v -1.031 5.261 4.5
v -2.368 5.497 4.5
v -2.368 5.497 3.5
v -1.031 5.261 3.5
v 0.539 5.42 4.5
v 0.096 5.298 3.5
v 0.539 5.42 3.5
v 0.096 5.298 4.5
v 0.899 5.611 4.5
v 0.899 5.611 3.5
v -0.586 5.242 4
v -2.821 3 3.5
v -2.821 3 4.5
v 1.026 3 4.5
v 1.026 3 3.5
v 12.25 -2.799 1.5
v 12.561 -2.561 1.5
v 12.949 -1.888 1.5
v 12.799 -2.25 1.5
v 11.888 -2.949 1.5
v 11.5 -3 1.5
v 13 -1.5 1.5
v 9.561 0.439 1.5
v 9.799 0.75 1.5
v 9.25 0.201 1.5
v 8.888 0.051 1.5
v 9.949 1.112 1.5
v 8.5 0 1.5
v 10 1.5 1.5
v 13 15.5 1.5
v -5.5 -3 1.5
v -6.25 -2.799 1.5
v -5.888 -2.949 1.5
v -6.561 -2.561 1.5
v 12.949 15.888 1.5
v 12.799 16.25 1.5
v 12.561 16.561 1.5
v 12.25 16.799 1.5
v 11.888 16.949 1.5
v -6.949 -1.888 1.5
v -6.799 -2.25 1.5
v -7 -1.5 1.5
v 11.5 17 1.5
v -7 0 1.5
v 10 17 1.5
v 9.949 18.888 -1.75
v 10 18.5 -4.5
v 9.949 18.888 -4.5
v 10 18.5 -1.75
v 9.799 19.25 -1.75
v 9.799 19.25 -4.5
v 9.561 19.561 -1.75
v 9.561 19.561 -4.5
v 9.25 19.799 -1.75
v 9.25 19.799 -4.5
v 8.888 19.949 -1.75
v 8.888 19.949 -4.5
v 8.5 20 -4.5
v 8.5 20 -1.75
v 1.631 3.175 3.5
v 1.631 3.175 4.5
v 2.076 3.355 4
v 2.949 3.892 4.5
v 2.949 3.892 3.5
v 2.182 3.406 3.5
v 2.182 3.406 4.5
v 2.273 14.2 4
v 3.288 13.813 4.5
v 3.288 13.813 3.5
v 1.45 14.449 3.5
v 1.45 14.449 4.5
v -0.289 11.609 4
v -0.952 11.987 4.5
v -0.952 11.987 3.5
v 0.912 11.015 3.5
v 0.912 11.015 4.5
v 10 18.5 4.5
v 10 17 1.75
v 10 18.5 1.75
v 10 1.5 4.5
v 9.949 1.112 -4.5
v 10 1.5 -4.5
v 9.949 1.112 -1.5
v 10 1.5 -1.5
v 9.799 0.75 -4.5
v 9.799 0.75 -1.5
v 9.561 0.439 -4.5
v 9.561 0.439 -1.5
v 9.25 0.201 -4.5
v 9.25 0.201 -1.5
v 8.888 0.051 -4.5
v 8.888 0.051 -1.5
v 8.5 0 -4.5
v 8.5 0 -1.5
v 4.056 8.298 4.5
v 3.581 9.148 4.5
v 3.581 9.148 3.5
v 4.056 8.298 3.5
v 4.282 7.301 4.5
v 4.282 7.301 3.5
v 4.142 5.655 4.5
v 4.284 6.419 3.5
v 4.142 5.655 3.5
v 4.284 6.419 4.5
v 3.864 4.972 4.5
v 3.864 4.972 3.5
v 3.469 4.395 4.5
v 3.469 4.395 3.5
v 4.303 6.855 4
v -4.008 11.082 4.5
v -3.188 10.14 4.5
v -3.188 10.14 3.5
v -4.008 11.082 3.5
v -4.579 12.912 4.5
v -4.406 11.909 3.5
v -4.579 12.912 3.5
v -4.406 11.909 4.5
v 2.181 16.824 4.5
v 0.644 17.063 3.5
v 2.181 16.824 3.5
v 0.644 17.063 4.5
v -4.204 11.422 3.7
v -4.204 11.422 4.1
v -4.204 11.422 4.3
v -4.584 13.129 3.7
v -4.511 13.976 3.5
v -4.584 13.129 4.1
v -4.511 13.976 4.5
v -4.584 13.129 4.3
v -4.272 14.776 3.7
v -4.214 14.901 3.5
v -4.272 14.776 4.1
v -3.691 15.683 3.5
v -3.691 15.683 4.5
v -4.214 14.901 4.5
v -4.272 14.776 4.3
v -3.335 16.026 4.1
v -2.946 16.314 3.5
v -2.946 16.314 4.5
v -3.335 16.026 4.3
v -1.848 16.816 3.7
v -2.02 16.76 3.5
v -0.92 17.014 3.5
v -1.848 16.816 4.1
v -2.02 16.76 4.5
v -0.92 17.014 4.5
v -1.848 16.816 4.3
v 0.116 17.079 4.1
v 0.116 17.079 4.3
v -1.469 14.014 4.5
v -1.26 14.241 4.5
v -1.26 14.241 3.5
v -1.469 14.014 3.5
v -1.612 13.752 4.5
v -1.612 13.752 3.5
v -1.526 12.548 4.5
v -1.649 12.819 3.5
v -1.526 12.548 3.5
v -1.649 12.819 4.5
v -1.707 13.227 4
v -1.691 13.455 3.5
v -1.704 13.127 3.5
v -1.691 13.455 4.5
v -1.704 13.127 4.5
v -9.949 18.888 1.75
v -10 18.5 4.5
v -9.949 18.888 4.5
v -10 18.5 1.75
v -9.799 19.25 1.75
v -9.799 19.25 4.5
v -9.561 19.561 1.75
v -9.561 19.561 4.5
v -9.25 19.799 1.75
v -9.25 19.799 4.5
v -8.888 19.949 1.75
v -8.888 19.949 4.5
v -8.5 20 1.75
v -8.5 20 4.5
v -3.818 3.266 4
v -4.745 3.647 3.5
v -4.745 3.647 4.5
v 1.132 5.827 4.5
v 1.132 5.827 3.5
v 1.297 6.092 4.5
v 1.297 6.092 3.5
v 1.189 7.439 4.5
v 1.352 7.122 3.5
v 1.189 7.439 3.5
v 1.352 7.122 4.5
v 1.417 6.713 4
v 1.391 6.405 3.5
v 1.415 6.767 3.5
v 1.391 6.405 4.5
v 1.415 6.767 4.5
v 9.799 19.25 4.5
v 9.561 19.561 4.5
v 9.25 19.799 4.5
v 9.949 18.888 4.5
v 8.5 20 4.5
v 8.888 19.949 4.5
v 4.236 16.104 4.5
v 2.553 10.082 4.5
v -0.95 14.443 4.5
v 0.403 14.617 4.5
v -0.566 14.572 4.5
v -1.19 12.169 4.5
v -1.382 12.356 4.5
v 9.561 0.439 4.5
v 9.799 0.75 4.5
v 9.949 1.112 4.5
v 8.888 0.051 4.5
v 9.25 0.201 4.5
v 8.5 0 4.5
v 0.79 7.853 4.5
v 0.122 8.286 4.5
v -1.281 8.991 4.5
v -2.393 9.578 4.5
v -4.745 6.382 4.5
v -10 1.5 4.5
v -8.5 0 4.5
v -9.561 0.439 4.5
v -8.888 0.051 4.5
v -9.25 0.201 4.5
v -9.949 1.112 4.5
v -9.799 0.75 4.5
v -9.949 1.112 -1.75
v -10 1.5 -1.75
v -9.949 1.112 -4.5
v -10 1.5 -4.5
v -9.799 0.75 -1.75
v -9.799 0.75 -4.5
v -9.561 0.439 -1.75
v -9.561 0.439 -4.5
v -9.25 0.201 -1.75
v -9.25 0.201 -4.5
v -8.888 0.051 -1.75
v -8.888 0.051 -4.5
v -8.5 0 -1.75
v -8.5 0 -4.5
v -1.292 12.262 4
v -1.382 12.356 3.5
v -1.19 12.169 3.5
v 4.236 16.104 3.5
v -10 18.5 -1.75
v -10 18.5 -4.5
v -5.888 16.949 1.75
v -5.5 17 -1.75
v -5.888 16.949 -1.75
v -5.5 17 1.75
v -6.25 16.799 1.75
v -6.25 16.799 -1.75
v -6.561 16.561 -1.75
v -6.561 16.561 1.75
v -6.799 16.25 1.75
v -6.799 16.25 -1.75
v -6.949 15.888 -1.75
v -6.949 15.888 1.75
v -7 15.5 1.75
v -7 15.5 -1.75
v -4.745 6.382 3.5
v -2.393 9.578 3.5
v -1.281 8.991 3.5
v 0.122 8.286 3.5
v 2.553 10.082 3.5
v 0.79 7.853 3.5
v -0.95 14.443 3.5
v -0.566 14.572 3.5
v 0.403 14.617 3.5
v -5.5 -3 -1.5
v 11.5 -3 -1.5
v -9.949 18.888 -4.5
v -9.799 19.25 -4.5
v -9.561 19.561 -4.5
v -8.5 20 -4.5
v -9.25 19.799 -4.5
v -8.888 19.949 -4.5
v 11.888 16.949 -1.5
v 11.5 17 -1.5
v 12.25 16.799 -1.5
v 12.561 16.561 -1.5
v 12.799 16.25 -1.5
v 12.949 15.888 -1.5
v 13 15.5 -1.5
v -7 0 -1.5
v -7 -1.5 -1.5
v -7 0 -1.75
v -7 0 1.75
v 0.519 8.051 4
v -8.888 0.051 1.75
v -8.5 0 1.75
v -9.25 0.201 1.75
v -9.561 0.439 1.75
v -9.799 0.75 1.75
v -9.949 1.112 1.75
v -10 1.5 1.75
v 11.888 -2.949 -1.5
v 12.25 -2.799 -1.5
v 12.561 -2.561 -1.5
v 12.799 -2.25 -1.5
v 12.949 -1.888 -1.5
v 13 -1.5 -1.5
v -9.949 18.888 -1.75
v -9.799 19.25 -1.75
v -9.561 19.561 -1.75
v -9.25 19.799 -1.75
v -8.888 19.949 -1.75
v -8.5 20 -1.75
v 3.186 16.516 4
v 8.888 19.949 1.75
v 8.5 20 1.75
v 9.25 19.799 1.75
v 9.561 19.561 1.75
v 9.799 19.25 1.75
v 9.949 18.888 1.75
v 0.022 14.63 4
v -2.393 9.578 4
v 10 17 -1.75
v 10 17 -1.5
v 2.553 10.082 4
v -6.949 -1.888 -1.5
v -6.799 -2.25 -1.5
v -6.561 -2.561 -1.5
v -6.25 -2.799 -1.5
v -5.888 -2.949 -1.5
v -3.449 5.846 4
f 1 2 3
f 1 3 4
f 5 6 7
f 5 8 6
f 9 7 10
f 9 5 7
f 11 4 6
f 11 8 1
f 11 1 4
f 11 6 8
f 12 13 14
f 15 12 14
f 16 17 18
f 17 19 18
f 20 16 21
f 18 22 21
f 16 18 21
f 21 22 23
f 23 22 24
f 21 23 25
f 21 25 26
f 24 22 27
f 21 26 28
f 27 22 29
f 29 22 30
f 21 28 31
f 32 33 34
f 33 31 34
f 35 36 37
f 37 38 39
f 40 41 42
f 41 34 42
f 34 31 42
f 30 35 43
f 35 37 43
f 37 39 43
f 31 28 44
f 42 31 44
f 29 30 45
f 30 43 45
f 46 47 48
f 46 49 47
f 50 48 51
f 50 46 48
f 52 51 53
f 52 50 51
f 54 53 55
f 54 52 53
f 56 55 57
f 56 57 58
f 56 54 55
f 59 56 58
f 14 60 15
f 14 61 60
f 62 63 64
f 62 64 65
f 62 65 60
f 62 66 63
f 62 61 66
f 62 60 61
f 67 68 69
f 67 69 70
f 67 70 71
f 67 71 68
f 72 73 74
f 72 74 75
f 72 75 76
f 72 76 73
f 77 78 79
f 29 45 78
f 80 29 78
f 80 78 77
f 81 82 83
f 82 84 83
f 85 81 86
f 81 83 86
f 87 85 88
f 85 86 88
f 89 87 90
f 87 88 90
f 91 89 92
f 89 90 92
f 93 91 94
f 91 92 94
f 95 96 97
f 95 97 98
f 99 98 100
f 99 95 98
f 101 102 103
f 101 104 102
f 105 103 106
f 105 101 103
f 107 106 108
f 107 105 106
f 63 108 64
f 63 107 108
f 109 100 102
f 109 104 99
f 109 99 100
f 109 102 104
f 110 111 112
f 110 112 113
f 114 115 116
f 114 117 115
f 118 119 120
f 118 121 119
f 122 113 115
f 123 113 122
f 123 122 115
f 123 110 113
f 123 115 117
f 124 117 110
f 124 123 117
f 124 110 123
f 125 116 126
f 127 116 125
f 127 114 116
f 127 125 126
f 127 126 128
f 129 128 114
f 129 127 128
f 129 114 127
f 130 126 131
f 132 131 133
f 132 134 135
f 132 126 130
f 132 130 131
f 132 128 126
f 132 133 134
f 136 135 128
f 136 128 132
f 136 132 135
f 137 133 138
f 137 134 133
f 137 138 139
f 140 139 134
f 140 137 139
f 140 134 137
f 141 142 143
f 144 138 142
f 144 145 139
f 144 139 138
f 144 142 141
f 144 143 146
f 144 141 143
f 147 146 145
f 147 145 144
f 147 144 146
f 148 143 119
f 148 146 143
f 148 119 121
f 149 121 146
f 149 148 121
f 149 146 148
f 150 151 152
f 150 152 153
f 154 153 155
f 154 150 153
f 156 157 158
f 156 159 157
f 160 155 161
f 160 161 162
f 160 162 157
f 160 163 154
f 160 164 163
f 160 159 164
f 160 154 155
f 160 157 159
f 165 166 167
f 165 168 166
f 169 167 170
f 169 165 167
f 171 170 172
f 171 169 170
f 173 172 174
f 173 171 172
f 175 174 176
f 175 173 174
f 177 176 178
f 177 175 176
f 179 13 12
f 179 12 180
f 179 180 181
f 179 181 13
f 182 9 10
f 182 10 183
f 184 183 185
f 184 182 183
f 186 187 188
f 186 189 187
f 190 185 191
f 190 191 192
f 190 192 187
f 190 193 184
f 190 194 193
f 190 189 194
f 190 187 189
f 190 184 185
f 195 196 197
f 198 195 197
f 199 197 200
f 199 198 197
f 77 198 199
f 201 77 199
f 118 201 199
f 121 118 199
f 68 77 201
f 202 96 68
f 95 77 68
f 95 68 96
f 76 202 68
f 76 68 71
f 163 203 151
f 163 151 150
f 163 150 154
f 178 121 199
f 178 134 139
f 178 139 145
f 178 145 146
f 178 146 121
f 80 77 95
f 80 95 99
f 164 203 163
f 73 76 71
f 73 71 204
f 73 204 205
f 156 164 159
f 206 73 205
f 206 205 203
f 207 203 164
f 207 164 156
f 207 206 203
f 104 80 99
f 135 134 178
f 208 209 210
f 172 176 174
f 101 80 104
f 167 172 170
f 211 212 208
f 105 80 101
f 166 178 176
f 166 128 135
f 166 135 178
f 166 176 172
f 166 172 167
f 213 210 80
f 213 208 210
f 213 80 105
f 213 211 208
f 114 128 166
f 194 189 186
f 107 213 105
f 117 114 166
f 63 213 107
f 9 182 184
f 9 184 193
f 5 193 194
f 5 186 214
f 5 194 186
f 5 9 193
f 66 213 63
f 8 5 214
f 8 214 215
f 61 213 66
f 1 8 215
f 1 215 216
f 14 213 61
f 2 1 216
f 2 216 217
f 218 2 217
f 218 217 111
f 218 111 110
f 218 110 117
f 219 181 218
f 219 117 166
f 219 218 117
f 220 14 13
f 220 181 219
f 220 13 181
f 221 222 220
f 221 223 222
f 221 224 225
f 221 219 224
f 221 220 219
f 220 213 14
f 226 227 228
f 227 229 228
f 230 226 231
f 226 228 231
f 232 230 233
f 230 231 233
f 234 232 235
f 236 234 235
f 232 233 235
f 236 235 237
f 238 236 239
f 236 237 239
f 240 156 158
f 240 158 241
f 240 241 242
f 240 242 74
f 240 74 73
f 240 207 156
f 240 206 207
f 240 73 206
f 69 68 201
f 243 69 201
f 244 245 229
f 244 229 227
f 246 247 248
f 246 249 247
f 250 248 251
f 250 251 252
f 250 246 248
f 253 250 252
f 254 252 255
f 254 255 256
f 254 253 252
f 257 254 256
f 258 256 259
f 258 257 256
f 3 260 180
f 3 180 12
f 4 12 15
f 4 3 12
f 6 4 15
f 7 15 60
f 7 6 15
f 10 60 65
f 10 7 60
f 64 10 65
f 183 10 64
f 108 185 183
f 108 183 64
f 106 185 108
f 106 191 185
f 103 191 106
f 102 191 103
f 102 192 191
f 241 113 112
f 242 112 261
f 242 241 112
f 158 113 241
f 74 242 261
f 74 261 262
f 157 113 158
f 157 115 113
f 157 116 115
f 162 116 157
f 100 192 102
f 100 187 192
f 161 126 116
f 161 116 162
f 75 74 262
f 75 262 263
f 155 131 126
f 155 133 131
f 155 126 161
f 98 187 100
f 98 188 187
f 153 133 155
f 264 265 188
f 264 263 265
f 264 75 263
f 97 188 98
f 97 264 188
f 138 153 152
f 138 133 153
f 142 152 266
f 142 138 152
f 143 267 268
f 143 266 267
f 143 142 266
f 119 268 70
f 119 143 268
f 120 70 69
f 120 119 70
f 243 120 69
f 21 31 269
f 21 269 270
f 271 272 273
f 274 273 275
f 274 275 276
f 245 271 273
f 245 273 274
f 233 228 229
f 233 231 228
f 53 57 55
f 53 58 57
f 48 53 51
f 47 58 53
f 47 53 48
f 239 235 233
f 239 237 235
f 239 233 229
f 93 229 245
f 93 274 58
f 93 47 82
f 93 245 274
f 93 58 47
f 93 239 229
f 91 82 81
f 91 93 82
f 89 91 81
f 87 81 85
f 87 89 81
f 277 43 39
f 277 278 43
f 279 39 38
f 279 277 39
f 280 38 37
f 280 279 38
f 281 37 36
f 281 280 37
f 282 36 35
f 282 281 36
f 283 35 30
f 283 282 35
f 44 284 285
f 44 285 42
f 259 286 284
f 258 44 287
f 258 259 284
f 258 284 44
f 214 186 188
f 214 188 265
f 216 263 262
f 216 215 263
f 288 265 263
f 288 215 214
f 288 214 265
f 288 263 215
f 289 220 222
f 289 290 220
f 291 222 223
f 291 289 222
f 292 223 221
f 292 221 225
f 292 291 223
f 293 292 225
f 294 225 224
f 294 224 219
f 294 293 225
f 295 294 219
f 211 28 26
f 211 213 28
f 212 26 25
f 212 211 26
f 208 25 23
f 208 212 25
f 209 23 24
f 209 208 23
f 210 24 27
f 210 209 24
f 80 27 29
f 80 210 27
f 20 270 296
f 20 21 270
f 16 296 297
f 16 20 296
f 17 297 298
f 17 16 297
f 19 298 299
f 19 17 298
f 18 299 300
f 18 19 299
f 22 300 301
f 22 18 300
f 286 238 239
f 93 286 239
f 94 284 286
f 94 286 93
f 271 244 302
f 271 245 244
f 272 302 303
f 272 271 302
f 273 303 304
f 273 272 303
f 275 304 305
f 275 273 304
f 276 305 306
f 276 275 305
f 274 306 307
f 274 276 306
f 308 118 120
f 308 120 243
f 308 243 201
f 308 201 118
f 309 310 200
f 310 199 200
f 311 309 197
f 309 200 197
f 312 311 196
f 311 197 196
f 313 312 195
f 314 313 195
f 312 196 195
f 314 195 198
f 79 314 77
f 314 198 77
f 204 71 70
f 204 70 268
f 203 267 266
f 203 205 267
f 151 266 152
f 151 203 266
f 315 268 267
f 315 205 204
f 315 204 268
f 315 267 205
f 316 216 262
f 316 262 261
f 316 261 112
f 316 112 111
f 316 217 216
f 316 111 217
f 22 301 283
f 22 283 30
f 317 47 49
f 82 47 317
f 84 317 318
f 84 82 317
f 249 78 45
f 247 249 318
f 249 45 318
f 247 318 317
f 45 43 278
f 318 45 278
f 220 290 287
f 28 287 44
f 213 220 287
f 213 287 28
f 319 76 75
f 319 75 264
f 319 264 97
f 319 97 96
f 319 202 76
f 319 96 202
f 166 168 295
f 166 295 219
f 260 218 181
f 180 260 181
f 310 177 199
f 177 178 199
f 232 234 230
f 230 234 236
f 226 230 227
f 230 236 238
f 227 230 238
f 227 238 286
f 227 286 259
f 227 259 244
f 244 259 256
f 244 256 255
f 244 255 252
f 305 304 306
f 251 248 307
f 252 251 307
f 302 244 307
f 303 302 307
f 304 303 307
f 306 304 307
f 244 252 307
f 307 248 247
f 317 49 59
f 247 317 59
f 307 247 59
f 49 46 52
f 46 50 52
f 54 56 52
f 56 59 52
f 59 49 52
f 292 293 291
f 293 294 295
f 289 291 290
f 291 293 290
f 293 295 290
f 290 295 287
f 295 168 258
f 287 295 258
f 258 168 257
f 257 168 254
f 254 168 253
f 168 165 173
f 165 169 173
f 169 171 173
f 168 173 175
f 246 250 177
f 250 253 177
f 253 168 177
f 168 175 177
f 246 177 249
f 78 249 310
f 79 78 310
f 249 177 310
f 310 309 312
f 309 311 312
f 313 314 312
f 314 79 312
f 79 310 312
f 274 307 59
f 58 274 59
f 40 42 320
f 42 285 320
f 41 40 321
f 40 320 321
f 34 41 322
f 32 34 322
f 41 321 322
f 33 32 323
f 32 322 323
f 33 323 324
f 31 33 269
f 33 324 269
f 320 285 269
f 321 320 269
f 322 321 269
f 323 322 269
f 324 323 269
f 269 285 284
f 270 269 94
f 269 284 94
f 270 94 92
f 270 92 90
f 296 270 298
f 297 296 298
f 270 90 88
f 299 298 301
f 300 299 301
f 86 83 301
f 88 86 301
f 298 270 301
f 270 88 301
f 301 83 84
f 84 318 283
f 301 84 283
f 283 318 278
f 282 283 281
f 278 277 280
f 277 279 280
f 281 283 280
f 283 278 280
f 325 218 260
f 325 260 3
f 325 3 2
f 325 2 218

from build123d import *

# Parameters (mm, degrees)
F0_W     = 14
F0_H     = 3
F0_W_2   = 3
F1_DEPTH = 20
F2_DEPTH = 3
F3_W     = 3
F3_H     = 3
F4_DEPTH = 100
F5_W     = 3
F5_H     = 3.5
F6_DEPTH = 100
F7_R     = 1.5
F9_DEPTH = 1


with BuildPart() as f1:
    # F0 (on Front) → F1 (new body)
    with BuildSketch(Plane.XZ):
        Polygon((10, 1.5), (10, 4.5), (-10, 4.5), (-10, 1.5), (-7, 1.5), (7, 1.5), align=None)
        Rectangle(F0_W, F0_H)
        with Locations((11.5, 0)):
            Rectangle(F0_W_2, F0_H)
        with Locations((8.5, 0)):
            Rectangle(F0_W_2, F0_H)
        with Locations((-8.5, 0)):
            Rectangle(F0_W_2, F0_H)
        Polygon((10, -4.5), (10, -1.5), (7, -1.5), (-7, -1.5), (-10, -1.5), (-10, -4.5), align=None)
    extrude(amount=-F1_DEPTH)

    # F0 (on Front) → F2 (join)
    with BuildSketch(Plane.XZ):
        with Locations((-8.5, 0)):
            Rectangle(F0_W_2, F0_H)
        Rectangle(F0_W, F0_H)
        with Locations((8.5, 0)):
            Rectangle(F0_W_2, F0_H)
        with Locations((11.5, 0)):
            Rectangle(F0_W_2, F0_H)
    extrude(amount=F2_DEPTH)

    # F3 (on face) → F4 (cut)
    with BuildSketch(Plane.YZ.offset(13)):
        Polygon((23, -1.75), (23, 1.75), (17, 1.75), (17, 1.5), (20, 1.5), (20, -1.5), (17, -1.5), (17, -1.75), align=None)
        with Locations((18.5, 0)):
            Rectangle(F3_W, F3_H)
    extrude(amount=-F4_DEPTH, mode=Mode.SUBTRACT)

    # F5 (on face) → F6 (cut)
    with BuildSketch(Plane(origin=(0, 17, 0), x_dir=(-1, 0, 0), z_dir=(0, 1, 0))):
        with Locations((11.5, 0)):
            Rectangle(F5_W, F5_H)
        with Locations((8.5, 0)):
            Rectangle(F5_W, F5_H)
    extrude(amount=-F6_DEPTH, mode=Mode.SUBTRACT)

    # F7
    f7_edges = [f1.edges().sort_by_distance(p)[0] for p in [
        (-7, -3, 0),
        (13, -3, 0),
        (10, 0, 3),
        (10, 0, -3),
        (-10, 0, -3.125),
        (-10, 0, 3.125),
        (-7, 17, 0),
        (-10, 20, 3.125),
        (-10, 20, -3.125),
        (13, 17, 0),
        (10, 20, 3.125),
        (10, 20, -3.125),
    ]]
    fillet(f7_edges, radius=F7_R)

    # F8 (on face) → F9 (cut)
    with BuildSketch(Plane.XY.offset(4.5)):
        with BuildLine():
            Line((-2.8206877235, 3), (1.0255347449, 3))
            add(Edge.make_bspline(
                [(2.9492867111, 3.8917100694), (2.1647599693, 3.2639125757), (1.0255347449, 3)],
                knots=[0, 0, 0, 0.5796214889, 0.5796214889, 0.5796214889], degree=2))
            add(Edge.make_bspline(
                [(4.3028023361, 6.85546875), (4.3028023361, 4.9748263889), (2.9492867111, 3.8917100694)],
                knots=[0, 0, 0, 1, 1, 1], degree=2))
            add(Edge.make_bspline(
                [(3.5812311556, 9.1477864583), (4.3028023361, 8.2135416667), (4.3028023361, 6.85546875)],
                knots=[0, 0, 0, 1, 1, 1], degree=2))
            add(Edge.make_bspline(
                [(0.9121773361, 11.0147569444), (2.859659975, 10.08203125), (3.5812311556, 9.1477864583)],
                knots=[0, 0, 0, 1, 1, 1], degree=2))
            add(Edge.make_bspline(
                [(-0.9517549555, 11.9869791667), (-0.558308775, 11.7165798611), (0.9121773361, 11.0147569444)],
                knots=[0, 0, 0, 1, 1, 1], degree=2))
            add(Edge.make_bspline(
                [(-1.5259737055, 12.5475260417), (-1.3452011361, 12.2573784722), (-0.9517549555, 11.9869791667)],
                knots=[0, 0, 0, 1, 1, 1], degree=2))
            add(Edge.make_bspline(
                [(-1.706746275, 13.2265625), (-1.706746275, 12.8376736111), (-1.5259737055, 12.5475260417)],
                knots=[0, 0, 0, 1, 1, 1], degree=2))
            add(Edge.make_bspline(
                [(-1.2601316916, 14.2413194444), (-1.706746275, 13.8524305556), (-1.706746275, 13.2265625)],
                knots=[0, 0, 0, 1, 1, 1], degree=2))
            add(Edge.make_bspline(
                [(0.0219863639, 14.6302083333), (-0.8135171083, 14.6302083333), (-1.2601316916, 14.2413194444)],
                knots=[0, 0, 0, 1, 1, 1], degree=2))
            add(Edge.make_bspline(
                [(1.4499377528, 14.4494357639), (0.7238092806, 14.6302083333), (0.0219863639, 14.6302083333)],
                knots=[0, 0, 0, 1, 1, 1], degree=2))
            add(Edge.make_bspline(
                [(3.2880453917, 13.8129340278), (2.176066225, 14.2686631944), (1.4499377528, 14.4494357639)],
                knots=[0, 0, 0, 1, 1, 1], degree=2))
            Line((3.2880453917, 13.8129340278), (4.2359620584, 16.1037326389))
            add(Edge.make_bspline(
                [(2.1806235167, 16.8237847222), (3.1634794195, 16.5685763889), (4.2359620584, 16.1037326389)],
                knots=[0, 0, 0, 1, 1, 1], degree=2))
            add(Edge.make_bspline(
                [(0.1161703917, 17.0789930556), (1.1977676139, 17.0789930556), (2.1806235167, 16.8237847222)],
                knots=[0, 0, 0, 1, 1, 1], degree=2))
            add(Edge.make_bspline(
                [(-3.3352184972, 16.0262586806), (-2.0865205805, 17.0789930556), (0.1161703917, 17.0789930556)],
                knots=[0, 0, 0, 1, 1, 1], degree=2))
            add(Edge.make_bspline(
                [(-4.5839164139, 13.1293402778), (-4.5839164139, 14.9735243056), (-3.3352184972, 16.0262586806)],
                knots=[0, 0, 0, 1, 1, 1], degree=2))
            add(Edge.make_bspline(
                [(-4.2041421083, 11.421875), (-4.5839164139, 12.1540798611), (-4.5839164139, 13.1293402778)],
                knots=[0, 0, 0, 1, 1, 1], degree=2))
            add(Edge.make_bspline(
                [(-3.1878660666, 10.1397569444), (-3.8243678027, 10.6896701389), (-4.2041421083, 11.421875)],
                knots=[0, 0, 0, 1, 1, 1], degree=2))
            add(Edge.make_bspline(
                [(-1.2813990527, 8.9913194444), (-2.5513643305, 9.58984375), (-3.1878660666, 10.1397569444)],
                knots=[0, 0, 0, 1, 1, 1], degree=2))
            add(Edge.make_bspline(
                [(0.5187311556, 8.0509982639), (0.0766738639, 8.3441840278), (-1.2813990527, 8.9913194444)],
                knots=[0, 0, 0, 1, 1, 1], degree=2))
            add(Edge.make_bspline(
                [(1.1886530306, 7.4388020833), (0.9607884473, 7.7578125), (0.5187311556, 8.0509982639)],
                knots=[0, 0, 0, 1, 1, 1], degree=2))
            add(Edge.make_bspline(
                [(1.4165176139, 6.7126736111), (1.4165176139, 7.1197916667), (1.1886530306, 7.4388020833)],
                knots=[0, 0, 0, 1, 1, 1], degree=2))
            add(Edge.make_bspline(
                [(0.8985054611, 5.611328125), (1.4165176139, 5.98046875), (1.4165176139, 6.7126736111)],
                knots=[0, 0, 0, 1, 1, 1], degree=2))
            add(Edge.make_bspline(
                [(-0.585652525, 5.2421875), (0.3804933084, 5.2421875), (0.8985054611, 5.611328125)],
                knots=[0, 0, 0, 1, 1, 1], degree=2))
            add(Edge.make_bspline(
                [(-2.3675535666, 5.4973958333), (-1.3938122472, 5.2421875), (-0.585652525, 5.2421875)],
                knots=[0, 0, 0, 1, 1, 1], degree=2))
            add(Edge.make_bspline(
                [(-4.7449407194, 6.3815104167), (-3.3412948861, 5.7526041667), (-2.3675535666, 5.4973958333)],
                knots=[0, 0, 0, 1, 1, 1], degree=2))
            Line((-4.7449407194, 6.3815104167), (-4.7449407194, 3.6471354167))
            add(Edge.make_bspline(
                [(-2.8206877235, 3), (-3.8532452246, 3.2092209032), (-4.7449407194, 3.6471354167)],
                knots=[0.477766543, 0.477766543, 0.477766543, 1, 1, 1], degree=2))
        make_face()
    extrude(amount=-F9_DEPTH, mode=Mode.SUBTRACT)


solid = f1.part
